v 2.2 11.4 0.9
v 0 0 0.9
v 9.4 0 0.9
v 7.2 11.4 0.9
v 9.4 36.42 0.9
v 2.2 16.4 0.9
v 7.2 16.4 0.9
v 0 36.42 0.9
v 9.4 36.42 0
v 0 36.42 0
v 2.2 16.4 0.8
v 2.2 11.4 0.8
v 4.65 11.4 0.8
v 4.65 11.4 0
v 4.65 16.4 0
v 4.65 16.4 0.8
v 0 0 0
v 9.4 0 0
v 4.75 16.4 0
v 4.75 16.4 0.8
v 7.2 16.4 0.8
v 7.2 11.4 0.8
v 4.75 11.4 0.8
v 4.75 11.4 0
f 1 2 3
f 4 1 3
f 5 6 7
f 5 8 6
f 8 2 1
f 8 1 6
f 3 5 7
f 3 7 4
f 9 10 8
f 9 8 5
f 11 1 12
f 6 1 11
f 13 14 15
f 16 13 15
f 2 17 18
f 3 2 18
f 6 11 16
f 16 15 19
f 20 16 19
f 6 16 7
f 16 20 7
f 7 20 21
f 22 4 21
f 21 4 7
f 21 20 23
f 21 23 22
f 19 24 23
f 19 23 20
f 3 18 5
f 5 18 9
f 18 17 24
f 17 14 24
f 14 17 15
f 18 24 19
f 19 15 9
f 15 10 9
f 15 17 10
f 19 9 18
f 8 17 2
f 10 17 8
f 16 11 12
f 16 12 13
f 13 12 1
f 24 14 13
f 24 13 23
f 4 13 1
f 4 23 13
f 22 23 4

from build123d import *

# Parameters (mm, degrees)
SKETCH_W     = 9.4
SKETCH_H     = 36.42
SKETCH_W_2   = 0.1
SKETCH_H_2   = 5
PAD_DEPTH    = 0.9
SKETCH001_W  = 5
SKETCH001_H  = 5
POCKET_DEPTH = 0.1


with BuildPart() as part:
    # Sketch → Pad (new body)
    with BuildSketch(Plane.XY):
        with Locations((4.7, 18.21)):
            Rectangle(SKETCH_W, SKETCH_H)
        with Locations((4.7, 13.9)):
            Rectangle(SKETCH_W_2, SKETCH_H_2, mode=Mode.SUBTRACT)
    extrude(amount=PAD_DEPTH)

    # Sketch001 (on Face10 of Pad) → Pocket (cut)
    with BuildSketch(Plane.XY.offset(0.9)):
        with Locations((4.7, 13.9)):
            Rectangle(SKETCH001_W, SKETCH001_H)
    extrude(amount=-POCKET_DEPTH, mode=Mode.SUBTRACT)


solid = part.part
